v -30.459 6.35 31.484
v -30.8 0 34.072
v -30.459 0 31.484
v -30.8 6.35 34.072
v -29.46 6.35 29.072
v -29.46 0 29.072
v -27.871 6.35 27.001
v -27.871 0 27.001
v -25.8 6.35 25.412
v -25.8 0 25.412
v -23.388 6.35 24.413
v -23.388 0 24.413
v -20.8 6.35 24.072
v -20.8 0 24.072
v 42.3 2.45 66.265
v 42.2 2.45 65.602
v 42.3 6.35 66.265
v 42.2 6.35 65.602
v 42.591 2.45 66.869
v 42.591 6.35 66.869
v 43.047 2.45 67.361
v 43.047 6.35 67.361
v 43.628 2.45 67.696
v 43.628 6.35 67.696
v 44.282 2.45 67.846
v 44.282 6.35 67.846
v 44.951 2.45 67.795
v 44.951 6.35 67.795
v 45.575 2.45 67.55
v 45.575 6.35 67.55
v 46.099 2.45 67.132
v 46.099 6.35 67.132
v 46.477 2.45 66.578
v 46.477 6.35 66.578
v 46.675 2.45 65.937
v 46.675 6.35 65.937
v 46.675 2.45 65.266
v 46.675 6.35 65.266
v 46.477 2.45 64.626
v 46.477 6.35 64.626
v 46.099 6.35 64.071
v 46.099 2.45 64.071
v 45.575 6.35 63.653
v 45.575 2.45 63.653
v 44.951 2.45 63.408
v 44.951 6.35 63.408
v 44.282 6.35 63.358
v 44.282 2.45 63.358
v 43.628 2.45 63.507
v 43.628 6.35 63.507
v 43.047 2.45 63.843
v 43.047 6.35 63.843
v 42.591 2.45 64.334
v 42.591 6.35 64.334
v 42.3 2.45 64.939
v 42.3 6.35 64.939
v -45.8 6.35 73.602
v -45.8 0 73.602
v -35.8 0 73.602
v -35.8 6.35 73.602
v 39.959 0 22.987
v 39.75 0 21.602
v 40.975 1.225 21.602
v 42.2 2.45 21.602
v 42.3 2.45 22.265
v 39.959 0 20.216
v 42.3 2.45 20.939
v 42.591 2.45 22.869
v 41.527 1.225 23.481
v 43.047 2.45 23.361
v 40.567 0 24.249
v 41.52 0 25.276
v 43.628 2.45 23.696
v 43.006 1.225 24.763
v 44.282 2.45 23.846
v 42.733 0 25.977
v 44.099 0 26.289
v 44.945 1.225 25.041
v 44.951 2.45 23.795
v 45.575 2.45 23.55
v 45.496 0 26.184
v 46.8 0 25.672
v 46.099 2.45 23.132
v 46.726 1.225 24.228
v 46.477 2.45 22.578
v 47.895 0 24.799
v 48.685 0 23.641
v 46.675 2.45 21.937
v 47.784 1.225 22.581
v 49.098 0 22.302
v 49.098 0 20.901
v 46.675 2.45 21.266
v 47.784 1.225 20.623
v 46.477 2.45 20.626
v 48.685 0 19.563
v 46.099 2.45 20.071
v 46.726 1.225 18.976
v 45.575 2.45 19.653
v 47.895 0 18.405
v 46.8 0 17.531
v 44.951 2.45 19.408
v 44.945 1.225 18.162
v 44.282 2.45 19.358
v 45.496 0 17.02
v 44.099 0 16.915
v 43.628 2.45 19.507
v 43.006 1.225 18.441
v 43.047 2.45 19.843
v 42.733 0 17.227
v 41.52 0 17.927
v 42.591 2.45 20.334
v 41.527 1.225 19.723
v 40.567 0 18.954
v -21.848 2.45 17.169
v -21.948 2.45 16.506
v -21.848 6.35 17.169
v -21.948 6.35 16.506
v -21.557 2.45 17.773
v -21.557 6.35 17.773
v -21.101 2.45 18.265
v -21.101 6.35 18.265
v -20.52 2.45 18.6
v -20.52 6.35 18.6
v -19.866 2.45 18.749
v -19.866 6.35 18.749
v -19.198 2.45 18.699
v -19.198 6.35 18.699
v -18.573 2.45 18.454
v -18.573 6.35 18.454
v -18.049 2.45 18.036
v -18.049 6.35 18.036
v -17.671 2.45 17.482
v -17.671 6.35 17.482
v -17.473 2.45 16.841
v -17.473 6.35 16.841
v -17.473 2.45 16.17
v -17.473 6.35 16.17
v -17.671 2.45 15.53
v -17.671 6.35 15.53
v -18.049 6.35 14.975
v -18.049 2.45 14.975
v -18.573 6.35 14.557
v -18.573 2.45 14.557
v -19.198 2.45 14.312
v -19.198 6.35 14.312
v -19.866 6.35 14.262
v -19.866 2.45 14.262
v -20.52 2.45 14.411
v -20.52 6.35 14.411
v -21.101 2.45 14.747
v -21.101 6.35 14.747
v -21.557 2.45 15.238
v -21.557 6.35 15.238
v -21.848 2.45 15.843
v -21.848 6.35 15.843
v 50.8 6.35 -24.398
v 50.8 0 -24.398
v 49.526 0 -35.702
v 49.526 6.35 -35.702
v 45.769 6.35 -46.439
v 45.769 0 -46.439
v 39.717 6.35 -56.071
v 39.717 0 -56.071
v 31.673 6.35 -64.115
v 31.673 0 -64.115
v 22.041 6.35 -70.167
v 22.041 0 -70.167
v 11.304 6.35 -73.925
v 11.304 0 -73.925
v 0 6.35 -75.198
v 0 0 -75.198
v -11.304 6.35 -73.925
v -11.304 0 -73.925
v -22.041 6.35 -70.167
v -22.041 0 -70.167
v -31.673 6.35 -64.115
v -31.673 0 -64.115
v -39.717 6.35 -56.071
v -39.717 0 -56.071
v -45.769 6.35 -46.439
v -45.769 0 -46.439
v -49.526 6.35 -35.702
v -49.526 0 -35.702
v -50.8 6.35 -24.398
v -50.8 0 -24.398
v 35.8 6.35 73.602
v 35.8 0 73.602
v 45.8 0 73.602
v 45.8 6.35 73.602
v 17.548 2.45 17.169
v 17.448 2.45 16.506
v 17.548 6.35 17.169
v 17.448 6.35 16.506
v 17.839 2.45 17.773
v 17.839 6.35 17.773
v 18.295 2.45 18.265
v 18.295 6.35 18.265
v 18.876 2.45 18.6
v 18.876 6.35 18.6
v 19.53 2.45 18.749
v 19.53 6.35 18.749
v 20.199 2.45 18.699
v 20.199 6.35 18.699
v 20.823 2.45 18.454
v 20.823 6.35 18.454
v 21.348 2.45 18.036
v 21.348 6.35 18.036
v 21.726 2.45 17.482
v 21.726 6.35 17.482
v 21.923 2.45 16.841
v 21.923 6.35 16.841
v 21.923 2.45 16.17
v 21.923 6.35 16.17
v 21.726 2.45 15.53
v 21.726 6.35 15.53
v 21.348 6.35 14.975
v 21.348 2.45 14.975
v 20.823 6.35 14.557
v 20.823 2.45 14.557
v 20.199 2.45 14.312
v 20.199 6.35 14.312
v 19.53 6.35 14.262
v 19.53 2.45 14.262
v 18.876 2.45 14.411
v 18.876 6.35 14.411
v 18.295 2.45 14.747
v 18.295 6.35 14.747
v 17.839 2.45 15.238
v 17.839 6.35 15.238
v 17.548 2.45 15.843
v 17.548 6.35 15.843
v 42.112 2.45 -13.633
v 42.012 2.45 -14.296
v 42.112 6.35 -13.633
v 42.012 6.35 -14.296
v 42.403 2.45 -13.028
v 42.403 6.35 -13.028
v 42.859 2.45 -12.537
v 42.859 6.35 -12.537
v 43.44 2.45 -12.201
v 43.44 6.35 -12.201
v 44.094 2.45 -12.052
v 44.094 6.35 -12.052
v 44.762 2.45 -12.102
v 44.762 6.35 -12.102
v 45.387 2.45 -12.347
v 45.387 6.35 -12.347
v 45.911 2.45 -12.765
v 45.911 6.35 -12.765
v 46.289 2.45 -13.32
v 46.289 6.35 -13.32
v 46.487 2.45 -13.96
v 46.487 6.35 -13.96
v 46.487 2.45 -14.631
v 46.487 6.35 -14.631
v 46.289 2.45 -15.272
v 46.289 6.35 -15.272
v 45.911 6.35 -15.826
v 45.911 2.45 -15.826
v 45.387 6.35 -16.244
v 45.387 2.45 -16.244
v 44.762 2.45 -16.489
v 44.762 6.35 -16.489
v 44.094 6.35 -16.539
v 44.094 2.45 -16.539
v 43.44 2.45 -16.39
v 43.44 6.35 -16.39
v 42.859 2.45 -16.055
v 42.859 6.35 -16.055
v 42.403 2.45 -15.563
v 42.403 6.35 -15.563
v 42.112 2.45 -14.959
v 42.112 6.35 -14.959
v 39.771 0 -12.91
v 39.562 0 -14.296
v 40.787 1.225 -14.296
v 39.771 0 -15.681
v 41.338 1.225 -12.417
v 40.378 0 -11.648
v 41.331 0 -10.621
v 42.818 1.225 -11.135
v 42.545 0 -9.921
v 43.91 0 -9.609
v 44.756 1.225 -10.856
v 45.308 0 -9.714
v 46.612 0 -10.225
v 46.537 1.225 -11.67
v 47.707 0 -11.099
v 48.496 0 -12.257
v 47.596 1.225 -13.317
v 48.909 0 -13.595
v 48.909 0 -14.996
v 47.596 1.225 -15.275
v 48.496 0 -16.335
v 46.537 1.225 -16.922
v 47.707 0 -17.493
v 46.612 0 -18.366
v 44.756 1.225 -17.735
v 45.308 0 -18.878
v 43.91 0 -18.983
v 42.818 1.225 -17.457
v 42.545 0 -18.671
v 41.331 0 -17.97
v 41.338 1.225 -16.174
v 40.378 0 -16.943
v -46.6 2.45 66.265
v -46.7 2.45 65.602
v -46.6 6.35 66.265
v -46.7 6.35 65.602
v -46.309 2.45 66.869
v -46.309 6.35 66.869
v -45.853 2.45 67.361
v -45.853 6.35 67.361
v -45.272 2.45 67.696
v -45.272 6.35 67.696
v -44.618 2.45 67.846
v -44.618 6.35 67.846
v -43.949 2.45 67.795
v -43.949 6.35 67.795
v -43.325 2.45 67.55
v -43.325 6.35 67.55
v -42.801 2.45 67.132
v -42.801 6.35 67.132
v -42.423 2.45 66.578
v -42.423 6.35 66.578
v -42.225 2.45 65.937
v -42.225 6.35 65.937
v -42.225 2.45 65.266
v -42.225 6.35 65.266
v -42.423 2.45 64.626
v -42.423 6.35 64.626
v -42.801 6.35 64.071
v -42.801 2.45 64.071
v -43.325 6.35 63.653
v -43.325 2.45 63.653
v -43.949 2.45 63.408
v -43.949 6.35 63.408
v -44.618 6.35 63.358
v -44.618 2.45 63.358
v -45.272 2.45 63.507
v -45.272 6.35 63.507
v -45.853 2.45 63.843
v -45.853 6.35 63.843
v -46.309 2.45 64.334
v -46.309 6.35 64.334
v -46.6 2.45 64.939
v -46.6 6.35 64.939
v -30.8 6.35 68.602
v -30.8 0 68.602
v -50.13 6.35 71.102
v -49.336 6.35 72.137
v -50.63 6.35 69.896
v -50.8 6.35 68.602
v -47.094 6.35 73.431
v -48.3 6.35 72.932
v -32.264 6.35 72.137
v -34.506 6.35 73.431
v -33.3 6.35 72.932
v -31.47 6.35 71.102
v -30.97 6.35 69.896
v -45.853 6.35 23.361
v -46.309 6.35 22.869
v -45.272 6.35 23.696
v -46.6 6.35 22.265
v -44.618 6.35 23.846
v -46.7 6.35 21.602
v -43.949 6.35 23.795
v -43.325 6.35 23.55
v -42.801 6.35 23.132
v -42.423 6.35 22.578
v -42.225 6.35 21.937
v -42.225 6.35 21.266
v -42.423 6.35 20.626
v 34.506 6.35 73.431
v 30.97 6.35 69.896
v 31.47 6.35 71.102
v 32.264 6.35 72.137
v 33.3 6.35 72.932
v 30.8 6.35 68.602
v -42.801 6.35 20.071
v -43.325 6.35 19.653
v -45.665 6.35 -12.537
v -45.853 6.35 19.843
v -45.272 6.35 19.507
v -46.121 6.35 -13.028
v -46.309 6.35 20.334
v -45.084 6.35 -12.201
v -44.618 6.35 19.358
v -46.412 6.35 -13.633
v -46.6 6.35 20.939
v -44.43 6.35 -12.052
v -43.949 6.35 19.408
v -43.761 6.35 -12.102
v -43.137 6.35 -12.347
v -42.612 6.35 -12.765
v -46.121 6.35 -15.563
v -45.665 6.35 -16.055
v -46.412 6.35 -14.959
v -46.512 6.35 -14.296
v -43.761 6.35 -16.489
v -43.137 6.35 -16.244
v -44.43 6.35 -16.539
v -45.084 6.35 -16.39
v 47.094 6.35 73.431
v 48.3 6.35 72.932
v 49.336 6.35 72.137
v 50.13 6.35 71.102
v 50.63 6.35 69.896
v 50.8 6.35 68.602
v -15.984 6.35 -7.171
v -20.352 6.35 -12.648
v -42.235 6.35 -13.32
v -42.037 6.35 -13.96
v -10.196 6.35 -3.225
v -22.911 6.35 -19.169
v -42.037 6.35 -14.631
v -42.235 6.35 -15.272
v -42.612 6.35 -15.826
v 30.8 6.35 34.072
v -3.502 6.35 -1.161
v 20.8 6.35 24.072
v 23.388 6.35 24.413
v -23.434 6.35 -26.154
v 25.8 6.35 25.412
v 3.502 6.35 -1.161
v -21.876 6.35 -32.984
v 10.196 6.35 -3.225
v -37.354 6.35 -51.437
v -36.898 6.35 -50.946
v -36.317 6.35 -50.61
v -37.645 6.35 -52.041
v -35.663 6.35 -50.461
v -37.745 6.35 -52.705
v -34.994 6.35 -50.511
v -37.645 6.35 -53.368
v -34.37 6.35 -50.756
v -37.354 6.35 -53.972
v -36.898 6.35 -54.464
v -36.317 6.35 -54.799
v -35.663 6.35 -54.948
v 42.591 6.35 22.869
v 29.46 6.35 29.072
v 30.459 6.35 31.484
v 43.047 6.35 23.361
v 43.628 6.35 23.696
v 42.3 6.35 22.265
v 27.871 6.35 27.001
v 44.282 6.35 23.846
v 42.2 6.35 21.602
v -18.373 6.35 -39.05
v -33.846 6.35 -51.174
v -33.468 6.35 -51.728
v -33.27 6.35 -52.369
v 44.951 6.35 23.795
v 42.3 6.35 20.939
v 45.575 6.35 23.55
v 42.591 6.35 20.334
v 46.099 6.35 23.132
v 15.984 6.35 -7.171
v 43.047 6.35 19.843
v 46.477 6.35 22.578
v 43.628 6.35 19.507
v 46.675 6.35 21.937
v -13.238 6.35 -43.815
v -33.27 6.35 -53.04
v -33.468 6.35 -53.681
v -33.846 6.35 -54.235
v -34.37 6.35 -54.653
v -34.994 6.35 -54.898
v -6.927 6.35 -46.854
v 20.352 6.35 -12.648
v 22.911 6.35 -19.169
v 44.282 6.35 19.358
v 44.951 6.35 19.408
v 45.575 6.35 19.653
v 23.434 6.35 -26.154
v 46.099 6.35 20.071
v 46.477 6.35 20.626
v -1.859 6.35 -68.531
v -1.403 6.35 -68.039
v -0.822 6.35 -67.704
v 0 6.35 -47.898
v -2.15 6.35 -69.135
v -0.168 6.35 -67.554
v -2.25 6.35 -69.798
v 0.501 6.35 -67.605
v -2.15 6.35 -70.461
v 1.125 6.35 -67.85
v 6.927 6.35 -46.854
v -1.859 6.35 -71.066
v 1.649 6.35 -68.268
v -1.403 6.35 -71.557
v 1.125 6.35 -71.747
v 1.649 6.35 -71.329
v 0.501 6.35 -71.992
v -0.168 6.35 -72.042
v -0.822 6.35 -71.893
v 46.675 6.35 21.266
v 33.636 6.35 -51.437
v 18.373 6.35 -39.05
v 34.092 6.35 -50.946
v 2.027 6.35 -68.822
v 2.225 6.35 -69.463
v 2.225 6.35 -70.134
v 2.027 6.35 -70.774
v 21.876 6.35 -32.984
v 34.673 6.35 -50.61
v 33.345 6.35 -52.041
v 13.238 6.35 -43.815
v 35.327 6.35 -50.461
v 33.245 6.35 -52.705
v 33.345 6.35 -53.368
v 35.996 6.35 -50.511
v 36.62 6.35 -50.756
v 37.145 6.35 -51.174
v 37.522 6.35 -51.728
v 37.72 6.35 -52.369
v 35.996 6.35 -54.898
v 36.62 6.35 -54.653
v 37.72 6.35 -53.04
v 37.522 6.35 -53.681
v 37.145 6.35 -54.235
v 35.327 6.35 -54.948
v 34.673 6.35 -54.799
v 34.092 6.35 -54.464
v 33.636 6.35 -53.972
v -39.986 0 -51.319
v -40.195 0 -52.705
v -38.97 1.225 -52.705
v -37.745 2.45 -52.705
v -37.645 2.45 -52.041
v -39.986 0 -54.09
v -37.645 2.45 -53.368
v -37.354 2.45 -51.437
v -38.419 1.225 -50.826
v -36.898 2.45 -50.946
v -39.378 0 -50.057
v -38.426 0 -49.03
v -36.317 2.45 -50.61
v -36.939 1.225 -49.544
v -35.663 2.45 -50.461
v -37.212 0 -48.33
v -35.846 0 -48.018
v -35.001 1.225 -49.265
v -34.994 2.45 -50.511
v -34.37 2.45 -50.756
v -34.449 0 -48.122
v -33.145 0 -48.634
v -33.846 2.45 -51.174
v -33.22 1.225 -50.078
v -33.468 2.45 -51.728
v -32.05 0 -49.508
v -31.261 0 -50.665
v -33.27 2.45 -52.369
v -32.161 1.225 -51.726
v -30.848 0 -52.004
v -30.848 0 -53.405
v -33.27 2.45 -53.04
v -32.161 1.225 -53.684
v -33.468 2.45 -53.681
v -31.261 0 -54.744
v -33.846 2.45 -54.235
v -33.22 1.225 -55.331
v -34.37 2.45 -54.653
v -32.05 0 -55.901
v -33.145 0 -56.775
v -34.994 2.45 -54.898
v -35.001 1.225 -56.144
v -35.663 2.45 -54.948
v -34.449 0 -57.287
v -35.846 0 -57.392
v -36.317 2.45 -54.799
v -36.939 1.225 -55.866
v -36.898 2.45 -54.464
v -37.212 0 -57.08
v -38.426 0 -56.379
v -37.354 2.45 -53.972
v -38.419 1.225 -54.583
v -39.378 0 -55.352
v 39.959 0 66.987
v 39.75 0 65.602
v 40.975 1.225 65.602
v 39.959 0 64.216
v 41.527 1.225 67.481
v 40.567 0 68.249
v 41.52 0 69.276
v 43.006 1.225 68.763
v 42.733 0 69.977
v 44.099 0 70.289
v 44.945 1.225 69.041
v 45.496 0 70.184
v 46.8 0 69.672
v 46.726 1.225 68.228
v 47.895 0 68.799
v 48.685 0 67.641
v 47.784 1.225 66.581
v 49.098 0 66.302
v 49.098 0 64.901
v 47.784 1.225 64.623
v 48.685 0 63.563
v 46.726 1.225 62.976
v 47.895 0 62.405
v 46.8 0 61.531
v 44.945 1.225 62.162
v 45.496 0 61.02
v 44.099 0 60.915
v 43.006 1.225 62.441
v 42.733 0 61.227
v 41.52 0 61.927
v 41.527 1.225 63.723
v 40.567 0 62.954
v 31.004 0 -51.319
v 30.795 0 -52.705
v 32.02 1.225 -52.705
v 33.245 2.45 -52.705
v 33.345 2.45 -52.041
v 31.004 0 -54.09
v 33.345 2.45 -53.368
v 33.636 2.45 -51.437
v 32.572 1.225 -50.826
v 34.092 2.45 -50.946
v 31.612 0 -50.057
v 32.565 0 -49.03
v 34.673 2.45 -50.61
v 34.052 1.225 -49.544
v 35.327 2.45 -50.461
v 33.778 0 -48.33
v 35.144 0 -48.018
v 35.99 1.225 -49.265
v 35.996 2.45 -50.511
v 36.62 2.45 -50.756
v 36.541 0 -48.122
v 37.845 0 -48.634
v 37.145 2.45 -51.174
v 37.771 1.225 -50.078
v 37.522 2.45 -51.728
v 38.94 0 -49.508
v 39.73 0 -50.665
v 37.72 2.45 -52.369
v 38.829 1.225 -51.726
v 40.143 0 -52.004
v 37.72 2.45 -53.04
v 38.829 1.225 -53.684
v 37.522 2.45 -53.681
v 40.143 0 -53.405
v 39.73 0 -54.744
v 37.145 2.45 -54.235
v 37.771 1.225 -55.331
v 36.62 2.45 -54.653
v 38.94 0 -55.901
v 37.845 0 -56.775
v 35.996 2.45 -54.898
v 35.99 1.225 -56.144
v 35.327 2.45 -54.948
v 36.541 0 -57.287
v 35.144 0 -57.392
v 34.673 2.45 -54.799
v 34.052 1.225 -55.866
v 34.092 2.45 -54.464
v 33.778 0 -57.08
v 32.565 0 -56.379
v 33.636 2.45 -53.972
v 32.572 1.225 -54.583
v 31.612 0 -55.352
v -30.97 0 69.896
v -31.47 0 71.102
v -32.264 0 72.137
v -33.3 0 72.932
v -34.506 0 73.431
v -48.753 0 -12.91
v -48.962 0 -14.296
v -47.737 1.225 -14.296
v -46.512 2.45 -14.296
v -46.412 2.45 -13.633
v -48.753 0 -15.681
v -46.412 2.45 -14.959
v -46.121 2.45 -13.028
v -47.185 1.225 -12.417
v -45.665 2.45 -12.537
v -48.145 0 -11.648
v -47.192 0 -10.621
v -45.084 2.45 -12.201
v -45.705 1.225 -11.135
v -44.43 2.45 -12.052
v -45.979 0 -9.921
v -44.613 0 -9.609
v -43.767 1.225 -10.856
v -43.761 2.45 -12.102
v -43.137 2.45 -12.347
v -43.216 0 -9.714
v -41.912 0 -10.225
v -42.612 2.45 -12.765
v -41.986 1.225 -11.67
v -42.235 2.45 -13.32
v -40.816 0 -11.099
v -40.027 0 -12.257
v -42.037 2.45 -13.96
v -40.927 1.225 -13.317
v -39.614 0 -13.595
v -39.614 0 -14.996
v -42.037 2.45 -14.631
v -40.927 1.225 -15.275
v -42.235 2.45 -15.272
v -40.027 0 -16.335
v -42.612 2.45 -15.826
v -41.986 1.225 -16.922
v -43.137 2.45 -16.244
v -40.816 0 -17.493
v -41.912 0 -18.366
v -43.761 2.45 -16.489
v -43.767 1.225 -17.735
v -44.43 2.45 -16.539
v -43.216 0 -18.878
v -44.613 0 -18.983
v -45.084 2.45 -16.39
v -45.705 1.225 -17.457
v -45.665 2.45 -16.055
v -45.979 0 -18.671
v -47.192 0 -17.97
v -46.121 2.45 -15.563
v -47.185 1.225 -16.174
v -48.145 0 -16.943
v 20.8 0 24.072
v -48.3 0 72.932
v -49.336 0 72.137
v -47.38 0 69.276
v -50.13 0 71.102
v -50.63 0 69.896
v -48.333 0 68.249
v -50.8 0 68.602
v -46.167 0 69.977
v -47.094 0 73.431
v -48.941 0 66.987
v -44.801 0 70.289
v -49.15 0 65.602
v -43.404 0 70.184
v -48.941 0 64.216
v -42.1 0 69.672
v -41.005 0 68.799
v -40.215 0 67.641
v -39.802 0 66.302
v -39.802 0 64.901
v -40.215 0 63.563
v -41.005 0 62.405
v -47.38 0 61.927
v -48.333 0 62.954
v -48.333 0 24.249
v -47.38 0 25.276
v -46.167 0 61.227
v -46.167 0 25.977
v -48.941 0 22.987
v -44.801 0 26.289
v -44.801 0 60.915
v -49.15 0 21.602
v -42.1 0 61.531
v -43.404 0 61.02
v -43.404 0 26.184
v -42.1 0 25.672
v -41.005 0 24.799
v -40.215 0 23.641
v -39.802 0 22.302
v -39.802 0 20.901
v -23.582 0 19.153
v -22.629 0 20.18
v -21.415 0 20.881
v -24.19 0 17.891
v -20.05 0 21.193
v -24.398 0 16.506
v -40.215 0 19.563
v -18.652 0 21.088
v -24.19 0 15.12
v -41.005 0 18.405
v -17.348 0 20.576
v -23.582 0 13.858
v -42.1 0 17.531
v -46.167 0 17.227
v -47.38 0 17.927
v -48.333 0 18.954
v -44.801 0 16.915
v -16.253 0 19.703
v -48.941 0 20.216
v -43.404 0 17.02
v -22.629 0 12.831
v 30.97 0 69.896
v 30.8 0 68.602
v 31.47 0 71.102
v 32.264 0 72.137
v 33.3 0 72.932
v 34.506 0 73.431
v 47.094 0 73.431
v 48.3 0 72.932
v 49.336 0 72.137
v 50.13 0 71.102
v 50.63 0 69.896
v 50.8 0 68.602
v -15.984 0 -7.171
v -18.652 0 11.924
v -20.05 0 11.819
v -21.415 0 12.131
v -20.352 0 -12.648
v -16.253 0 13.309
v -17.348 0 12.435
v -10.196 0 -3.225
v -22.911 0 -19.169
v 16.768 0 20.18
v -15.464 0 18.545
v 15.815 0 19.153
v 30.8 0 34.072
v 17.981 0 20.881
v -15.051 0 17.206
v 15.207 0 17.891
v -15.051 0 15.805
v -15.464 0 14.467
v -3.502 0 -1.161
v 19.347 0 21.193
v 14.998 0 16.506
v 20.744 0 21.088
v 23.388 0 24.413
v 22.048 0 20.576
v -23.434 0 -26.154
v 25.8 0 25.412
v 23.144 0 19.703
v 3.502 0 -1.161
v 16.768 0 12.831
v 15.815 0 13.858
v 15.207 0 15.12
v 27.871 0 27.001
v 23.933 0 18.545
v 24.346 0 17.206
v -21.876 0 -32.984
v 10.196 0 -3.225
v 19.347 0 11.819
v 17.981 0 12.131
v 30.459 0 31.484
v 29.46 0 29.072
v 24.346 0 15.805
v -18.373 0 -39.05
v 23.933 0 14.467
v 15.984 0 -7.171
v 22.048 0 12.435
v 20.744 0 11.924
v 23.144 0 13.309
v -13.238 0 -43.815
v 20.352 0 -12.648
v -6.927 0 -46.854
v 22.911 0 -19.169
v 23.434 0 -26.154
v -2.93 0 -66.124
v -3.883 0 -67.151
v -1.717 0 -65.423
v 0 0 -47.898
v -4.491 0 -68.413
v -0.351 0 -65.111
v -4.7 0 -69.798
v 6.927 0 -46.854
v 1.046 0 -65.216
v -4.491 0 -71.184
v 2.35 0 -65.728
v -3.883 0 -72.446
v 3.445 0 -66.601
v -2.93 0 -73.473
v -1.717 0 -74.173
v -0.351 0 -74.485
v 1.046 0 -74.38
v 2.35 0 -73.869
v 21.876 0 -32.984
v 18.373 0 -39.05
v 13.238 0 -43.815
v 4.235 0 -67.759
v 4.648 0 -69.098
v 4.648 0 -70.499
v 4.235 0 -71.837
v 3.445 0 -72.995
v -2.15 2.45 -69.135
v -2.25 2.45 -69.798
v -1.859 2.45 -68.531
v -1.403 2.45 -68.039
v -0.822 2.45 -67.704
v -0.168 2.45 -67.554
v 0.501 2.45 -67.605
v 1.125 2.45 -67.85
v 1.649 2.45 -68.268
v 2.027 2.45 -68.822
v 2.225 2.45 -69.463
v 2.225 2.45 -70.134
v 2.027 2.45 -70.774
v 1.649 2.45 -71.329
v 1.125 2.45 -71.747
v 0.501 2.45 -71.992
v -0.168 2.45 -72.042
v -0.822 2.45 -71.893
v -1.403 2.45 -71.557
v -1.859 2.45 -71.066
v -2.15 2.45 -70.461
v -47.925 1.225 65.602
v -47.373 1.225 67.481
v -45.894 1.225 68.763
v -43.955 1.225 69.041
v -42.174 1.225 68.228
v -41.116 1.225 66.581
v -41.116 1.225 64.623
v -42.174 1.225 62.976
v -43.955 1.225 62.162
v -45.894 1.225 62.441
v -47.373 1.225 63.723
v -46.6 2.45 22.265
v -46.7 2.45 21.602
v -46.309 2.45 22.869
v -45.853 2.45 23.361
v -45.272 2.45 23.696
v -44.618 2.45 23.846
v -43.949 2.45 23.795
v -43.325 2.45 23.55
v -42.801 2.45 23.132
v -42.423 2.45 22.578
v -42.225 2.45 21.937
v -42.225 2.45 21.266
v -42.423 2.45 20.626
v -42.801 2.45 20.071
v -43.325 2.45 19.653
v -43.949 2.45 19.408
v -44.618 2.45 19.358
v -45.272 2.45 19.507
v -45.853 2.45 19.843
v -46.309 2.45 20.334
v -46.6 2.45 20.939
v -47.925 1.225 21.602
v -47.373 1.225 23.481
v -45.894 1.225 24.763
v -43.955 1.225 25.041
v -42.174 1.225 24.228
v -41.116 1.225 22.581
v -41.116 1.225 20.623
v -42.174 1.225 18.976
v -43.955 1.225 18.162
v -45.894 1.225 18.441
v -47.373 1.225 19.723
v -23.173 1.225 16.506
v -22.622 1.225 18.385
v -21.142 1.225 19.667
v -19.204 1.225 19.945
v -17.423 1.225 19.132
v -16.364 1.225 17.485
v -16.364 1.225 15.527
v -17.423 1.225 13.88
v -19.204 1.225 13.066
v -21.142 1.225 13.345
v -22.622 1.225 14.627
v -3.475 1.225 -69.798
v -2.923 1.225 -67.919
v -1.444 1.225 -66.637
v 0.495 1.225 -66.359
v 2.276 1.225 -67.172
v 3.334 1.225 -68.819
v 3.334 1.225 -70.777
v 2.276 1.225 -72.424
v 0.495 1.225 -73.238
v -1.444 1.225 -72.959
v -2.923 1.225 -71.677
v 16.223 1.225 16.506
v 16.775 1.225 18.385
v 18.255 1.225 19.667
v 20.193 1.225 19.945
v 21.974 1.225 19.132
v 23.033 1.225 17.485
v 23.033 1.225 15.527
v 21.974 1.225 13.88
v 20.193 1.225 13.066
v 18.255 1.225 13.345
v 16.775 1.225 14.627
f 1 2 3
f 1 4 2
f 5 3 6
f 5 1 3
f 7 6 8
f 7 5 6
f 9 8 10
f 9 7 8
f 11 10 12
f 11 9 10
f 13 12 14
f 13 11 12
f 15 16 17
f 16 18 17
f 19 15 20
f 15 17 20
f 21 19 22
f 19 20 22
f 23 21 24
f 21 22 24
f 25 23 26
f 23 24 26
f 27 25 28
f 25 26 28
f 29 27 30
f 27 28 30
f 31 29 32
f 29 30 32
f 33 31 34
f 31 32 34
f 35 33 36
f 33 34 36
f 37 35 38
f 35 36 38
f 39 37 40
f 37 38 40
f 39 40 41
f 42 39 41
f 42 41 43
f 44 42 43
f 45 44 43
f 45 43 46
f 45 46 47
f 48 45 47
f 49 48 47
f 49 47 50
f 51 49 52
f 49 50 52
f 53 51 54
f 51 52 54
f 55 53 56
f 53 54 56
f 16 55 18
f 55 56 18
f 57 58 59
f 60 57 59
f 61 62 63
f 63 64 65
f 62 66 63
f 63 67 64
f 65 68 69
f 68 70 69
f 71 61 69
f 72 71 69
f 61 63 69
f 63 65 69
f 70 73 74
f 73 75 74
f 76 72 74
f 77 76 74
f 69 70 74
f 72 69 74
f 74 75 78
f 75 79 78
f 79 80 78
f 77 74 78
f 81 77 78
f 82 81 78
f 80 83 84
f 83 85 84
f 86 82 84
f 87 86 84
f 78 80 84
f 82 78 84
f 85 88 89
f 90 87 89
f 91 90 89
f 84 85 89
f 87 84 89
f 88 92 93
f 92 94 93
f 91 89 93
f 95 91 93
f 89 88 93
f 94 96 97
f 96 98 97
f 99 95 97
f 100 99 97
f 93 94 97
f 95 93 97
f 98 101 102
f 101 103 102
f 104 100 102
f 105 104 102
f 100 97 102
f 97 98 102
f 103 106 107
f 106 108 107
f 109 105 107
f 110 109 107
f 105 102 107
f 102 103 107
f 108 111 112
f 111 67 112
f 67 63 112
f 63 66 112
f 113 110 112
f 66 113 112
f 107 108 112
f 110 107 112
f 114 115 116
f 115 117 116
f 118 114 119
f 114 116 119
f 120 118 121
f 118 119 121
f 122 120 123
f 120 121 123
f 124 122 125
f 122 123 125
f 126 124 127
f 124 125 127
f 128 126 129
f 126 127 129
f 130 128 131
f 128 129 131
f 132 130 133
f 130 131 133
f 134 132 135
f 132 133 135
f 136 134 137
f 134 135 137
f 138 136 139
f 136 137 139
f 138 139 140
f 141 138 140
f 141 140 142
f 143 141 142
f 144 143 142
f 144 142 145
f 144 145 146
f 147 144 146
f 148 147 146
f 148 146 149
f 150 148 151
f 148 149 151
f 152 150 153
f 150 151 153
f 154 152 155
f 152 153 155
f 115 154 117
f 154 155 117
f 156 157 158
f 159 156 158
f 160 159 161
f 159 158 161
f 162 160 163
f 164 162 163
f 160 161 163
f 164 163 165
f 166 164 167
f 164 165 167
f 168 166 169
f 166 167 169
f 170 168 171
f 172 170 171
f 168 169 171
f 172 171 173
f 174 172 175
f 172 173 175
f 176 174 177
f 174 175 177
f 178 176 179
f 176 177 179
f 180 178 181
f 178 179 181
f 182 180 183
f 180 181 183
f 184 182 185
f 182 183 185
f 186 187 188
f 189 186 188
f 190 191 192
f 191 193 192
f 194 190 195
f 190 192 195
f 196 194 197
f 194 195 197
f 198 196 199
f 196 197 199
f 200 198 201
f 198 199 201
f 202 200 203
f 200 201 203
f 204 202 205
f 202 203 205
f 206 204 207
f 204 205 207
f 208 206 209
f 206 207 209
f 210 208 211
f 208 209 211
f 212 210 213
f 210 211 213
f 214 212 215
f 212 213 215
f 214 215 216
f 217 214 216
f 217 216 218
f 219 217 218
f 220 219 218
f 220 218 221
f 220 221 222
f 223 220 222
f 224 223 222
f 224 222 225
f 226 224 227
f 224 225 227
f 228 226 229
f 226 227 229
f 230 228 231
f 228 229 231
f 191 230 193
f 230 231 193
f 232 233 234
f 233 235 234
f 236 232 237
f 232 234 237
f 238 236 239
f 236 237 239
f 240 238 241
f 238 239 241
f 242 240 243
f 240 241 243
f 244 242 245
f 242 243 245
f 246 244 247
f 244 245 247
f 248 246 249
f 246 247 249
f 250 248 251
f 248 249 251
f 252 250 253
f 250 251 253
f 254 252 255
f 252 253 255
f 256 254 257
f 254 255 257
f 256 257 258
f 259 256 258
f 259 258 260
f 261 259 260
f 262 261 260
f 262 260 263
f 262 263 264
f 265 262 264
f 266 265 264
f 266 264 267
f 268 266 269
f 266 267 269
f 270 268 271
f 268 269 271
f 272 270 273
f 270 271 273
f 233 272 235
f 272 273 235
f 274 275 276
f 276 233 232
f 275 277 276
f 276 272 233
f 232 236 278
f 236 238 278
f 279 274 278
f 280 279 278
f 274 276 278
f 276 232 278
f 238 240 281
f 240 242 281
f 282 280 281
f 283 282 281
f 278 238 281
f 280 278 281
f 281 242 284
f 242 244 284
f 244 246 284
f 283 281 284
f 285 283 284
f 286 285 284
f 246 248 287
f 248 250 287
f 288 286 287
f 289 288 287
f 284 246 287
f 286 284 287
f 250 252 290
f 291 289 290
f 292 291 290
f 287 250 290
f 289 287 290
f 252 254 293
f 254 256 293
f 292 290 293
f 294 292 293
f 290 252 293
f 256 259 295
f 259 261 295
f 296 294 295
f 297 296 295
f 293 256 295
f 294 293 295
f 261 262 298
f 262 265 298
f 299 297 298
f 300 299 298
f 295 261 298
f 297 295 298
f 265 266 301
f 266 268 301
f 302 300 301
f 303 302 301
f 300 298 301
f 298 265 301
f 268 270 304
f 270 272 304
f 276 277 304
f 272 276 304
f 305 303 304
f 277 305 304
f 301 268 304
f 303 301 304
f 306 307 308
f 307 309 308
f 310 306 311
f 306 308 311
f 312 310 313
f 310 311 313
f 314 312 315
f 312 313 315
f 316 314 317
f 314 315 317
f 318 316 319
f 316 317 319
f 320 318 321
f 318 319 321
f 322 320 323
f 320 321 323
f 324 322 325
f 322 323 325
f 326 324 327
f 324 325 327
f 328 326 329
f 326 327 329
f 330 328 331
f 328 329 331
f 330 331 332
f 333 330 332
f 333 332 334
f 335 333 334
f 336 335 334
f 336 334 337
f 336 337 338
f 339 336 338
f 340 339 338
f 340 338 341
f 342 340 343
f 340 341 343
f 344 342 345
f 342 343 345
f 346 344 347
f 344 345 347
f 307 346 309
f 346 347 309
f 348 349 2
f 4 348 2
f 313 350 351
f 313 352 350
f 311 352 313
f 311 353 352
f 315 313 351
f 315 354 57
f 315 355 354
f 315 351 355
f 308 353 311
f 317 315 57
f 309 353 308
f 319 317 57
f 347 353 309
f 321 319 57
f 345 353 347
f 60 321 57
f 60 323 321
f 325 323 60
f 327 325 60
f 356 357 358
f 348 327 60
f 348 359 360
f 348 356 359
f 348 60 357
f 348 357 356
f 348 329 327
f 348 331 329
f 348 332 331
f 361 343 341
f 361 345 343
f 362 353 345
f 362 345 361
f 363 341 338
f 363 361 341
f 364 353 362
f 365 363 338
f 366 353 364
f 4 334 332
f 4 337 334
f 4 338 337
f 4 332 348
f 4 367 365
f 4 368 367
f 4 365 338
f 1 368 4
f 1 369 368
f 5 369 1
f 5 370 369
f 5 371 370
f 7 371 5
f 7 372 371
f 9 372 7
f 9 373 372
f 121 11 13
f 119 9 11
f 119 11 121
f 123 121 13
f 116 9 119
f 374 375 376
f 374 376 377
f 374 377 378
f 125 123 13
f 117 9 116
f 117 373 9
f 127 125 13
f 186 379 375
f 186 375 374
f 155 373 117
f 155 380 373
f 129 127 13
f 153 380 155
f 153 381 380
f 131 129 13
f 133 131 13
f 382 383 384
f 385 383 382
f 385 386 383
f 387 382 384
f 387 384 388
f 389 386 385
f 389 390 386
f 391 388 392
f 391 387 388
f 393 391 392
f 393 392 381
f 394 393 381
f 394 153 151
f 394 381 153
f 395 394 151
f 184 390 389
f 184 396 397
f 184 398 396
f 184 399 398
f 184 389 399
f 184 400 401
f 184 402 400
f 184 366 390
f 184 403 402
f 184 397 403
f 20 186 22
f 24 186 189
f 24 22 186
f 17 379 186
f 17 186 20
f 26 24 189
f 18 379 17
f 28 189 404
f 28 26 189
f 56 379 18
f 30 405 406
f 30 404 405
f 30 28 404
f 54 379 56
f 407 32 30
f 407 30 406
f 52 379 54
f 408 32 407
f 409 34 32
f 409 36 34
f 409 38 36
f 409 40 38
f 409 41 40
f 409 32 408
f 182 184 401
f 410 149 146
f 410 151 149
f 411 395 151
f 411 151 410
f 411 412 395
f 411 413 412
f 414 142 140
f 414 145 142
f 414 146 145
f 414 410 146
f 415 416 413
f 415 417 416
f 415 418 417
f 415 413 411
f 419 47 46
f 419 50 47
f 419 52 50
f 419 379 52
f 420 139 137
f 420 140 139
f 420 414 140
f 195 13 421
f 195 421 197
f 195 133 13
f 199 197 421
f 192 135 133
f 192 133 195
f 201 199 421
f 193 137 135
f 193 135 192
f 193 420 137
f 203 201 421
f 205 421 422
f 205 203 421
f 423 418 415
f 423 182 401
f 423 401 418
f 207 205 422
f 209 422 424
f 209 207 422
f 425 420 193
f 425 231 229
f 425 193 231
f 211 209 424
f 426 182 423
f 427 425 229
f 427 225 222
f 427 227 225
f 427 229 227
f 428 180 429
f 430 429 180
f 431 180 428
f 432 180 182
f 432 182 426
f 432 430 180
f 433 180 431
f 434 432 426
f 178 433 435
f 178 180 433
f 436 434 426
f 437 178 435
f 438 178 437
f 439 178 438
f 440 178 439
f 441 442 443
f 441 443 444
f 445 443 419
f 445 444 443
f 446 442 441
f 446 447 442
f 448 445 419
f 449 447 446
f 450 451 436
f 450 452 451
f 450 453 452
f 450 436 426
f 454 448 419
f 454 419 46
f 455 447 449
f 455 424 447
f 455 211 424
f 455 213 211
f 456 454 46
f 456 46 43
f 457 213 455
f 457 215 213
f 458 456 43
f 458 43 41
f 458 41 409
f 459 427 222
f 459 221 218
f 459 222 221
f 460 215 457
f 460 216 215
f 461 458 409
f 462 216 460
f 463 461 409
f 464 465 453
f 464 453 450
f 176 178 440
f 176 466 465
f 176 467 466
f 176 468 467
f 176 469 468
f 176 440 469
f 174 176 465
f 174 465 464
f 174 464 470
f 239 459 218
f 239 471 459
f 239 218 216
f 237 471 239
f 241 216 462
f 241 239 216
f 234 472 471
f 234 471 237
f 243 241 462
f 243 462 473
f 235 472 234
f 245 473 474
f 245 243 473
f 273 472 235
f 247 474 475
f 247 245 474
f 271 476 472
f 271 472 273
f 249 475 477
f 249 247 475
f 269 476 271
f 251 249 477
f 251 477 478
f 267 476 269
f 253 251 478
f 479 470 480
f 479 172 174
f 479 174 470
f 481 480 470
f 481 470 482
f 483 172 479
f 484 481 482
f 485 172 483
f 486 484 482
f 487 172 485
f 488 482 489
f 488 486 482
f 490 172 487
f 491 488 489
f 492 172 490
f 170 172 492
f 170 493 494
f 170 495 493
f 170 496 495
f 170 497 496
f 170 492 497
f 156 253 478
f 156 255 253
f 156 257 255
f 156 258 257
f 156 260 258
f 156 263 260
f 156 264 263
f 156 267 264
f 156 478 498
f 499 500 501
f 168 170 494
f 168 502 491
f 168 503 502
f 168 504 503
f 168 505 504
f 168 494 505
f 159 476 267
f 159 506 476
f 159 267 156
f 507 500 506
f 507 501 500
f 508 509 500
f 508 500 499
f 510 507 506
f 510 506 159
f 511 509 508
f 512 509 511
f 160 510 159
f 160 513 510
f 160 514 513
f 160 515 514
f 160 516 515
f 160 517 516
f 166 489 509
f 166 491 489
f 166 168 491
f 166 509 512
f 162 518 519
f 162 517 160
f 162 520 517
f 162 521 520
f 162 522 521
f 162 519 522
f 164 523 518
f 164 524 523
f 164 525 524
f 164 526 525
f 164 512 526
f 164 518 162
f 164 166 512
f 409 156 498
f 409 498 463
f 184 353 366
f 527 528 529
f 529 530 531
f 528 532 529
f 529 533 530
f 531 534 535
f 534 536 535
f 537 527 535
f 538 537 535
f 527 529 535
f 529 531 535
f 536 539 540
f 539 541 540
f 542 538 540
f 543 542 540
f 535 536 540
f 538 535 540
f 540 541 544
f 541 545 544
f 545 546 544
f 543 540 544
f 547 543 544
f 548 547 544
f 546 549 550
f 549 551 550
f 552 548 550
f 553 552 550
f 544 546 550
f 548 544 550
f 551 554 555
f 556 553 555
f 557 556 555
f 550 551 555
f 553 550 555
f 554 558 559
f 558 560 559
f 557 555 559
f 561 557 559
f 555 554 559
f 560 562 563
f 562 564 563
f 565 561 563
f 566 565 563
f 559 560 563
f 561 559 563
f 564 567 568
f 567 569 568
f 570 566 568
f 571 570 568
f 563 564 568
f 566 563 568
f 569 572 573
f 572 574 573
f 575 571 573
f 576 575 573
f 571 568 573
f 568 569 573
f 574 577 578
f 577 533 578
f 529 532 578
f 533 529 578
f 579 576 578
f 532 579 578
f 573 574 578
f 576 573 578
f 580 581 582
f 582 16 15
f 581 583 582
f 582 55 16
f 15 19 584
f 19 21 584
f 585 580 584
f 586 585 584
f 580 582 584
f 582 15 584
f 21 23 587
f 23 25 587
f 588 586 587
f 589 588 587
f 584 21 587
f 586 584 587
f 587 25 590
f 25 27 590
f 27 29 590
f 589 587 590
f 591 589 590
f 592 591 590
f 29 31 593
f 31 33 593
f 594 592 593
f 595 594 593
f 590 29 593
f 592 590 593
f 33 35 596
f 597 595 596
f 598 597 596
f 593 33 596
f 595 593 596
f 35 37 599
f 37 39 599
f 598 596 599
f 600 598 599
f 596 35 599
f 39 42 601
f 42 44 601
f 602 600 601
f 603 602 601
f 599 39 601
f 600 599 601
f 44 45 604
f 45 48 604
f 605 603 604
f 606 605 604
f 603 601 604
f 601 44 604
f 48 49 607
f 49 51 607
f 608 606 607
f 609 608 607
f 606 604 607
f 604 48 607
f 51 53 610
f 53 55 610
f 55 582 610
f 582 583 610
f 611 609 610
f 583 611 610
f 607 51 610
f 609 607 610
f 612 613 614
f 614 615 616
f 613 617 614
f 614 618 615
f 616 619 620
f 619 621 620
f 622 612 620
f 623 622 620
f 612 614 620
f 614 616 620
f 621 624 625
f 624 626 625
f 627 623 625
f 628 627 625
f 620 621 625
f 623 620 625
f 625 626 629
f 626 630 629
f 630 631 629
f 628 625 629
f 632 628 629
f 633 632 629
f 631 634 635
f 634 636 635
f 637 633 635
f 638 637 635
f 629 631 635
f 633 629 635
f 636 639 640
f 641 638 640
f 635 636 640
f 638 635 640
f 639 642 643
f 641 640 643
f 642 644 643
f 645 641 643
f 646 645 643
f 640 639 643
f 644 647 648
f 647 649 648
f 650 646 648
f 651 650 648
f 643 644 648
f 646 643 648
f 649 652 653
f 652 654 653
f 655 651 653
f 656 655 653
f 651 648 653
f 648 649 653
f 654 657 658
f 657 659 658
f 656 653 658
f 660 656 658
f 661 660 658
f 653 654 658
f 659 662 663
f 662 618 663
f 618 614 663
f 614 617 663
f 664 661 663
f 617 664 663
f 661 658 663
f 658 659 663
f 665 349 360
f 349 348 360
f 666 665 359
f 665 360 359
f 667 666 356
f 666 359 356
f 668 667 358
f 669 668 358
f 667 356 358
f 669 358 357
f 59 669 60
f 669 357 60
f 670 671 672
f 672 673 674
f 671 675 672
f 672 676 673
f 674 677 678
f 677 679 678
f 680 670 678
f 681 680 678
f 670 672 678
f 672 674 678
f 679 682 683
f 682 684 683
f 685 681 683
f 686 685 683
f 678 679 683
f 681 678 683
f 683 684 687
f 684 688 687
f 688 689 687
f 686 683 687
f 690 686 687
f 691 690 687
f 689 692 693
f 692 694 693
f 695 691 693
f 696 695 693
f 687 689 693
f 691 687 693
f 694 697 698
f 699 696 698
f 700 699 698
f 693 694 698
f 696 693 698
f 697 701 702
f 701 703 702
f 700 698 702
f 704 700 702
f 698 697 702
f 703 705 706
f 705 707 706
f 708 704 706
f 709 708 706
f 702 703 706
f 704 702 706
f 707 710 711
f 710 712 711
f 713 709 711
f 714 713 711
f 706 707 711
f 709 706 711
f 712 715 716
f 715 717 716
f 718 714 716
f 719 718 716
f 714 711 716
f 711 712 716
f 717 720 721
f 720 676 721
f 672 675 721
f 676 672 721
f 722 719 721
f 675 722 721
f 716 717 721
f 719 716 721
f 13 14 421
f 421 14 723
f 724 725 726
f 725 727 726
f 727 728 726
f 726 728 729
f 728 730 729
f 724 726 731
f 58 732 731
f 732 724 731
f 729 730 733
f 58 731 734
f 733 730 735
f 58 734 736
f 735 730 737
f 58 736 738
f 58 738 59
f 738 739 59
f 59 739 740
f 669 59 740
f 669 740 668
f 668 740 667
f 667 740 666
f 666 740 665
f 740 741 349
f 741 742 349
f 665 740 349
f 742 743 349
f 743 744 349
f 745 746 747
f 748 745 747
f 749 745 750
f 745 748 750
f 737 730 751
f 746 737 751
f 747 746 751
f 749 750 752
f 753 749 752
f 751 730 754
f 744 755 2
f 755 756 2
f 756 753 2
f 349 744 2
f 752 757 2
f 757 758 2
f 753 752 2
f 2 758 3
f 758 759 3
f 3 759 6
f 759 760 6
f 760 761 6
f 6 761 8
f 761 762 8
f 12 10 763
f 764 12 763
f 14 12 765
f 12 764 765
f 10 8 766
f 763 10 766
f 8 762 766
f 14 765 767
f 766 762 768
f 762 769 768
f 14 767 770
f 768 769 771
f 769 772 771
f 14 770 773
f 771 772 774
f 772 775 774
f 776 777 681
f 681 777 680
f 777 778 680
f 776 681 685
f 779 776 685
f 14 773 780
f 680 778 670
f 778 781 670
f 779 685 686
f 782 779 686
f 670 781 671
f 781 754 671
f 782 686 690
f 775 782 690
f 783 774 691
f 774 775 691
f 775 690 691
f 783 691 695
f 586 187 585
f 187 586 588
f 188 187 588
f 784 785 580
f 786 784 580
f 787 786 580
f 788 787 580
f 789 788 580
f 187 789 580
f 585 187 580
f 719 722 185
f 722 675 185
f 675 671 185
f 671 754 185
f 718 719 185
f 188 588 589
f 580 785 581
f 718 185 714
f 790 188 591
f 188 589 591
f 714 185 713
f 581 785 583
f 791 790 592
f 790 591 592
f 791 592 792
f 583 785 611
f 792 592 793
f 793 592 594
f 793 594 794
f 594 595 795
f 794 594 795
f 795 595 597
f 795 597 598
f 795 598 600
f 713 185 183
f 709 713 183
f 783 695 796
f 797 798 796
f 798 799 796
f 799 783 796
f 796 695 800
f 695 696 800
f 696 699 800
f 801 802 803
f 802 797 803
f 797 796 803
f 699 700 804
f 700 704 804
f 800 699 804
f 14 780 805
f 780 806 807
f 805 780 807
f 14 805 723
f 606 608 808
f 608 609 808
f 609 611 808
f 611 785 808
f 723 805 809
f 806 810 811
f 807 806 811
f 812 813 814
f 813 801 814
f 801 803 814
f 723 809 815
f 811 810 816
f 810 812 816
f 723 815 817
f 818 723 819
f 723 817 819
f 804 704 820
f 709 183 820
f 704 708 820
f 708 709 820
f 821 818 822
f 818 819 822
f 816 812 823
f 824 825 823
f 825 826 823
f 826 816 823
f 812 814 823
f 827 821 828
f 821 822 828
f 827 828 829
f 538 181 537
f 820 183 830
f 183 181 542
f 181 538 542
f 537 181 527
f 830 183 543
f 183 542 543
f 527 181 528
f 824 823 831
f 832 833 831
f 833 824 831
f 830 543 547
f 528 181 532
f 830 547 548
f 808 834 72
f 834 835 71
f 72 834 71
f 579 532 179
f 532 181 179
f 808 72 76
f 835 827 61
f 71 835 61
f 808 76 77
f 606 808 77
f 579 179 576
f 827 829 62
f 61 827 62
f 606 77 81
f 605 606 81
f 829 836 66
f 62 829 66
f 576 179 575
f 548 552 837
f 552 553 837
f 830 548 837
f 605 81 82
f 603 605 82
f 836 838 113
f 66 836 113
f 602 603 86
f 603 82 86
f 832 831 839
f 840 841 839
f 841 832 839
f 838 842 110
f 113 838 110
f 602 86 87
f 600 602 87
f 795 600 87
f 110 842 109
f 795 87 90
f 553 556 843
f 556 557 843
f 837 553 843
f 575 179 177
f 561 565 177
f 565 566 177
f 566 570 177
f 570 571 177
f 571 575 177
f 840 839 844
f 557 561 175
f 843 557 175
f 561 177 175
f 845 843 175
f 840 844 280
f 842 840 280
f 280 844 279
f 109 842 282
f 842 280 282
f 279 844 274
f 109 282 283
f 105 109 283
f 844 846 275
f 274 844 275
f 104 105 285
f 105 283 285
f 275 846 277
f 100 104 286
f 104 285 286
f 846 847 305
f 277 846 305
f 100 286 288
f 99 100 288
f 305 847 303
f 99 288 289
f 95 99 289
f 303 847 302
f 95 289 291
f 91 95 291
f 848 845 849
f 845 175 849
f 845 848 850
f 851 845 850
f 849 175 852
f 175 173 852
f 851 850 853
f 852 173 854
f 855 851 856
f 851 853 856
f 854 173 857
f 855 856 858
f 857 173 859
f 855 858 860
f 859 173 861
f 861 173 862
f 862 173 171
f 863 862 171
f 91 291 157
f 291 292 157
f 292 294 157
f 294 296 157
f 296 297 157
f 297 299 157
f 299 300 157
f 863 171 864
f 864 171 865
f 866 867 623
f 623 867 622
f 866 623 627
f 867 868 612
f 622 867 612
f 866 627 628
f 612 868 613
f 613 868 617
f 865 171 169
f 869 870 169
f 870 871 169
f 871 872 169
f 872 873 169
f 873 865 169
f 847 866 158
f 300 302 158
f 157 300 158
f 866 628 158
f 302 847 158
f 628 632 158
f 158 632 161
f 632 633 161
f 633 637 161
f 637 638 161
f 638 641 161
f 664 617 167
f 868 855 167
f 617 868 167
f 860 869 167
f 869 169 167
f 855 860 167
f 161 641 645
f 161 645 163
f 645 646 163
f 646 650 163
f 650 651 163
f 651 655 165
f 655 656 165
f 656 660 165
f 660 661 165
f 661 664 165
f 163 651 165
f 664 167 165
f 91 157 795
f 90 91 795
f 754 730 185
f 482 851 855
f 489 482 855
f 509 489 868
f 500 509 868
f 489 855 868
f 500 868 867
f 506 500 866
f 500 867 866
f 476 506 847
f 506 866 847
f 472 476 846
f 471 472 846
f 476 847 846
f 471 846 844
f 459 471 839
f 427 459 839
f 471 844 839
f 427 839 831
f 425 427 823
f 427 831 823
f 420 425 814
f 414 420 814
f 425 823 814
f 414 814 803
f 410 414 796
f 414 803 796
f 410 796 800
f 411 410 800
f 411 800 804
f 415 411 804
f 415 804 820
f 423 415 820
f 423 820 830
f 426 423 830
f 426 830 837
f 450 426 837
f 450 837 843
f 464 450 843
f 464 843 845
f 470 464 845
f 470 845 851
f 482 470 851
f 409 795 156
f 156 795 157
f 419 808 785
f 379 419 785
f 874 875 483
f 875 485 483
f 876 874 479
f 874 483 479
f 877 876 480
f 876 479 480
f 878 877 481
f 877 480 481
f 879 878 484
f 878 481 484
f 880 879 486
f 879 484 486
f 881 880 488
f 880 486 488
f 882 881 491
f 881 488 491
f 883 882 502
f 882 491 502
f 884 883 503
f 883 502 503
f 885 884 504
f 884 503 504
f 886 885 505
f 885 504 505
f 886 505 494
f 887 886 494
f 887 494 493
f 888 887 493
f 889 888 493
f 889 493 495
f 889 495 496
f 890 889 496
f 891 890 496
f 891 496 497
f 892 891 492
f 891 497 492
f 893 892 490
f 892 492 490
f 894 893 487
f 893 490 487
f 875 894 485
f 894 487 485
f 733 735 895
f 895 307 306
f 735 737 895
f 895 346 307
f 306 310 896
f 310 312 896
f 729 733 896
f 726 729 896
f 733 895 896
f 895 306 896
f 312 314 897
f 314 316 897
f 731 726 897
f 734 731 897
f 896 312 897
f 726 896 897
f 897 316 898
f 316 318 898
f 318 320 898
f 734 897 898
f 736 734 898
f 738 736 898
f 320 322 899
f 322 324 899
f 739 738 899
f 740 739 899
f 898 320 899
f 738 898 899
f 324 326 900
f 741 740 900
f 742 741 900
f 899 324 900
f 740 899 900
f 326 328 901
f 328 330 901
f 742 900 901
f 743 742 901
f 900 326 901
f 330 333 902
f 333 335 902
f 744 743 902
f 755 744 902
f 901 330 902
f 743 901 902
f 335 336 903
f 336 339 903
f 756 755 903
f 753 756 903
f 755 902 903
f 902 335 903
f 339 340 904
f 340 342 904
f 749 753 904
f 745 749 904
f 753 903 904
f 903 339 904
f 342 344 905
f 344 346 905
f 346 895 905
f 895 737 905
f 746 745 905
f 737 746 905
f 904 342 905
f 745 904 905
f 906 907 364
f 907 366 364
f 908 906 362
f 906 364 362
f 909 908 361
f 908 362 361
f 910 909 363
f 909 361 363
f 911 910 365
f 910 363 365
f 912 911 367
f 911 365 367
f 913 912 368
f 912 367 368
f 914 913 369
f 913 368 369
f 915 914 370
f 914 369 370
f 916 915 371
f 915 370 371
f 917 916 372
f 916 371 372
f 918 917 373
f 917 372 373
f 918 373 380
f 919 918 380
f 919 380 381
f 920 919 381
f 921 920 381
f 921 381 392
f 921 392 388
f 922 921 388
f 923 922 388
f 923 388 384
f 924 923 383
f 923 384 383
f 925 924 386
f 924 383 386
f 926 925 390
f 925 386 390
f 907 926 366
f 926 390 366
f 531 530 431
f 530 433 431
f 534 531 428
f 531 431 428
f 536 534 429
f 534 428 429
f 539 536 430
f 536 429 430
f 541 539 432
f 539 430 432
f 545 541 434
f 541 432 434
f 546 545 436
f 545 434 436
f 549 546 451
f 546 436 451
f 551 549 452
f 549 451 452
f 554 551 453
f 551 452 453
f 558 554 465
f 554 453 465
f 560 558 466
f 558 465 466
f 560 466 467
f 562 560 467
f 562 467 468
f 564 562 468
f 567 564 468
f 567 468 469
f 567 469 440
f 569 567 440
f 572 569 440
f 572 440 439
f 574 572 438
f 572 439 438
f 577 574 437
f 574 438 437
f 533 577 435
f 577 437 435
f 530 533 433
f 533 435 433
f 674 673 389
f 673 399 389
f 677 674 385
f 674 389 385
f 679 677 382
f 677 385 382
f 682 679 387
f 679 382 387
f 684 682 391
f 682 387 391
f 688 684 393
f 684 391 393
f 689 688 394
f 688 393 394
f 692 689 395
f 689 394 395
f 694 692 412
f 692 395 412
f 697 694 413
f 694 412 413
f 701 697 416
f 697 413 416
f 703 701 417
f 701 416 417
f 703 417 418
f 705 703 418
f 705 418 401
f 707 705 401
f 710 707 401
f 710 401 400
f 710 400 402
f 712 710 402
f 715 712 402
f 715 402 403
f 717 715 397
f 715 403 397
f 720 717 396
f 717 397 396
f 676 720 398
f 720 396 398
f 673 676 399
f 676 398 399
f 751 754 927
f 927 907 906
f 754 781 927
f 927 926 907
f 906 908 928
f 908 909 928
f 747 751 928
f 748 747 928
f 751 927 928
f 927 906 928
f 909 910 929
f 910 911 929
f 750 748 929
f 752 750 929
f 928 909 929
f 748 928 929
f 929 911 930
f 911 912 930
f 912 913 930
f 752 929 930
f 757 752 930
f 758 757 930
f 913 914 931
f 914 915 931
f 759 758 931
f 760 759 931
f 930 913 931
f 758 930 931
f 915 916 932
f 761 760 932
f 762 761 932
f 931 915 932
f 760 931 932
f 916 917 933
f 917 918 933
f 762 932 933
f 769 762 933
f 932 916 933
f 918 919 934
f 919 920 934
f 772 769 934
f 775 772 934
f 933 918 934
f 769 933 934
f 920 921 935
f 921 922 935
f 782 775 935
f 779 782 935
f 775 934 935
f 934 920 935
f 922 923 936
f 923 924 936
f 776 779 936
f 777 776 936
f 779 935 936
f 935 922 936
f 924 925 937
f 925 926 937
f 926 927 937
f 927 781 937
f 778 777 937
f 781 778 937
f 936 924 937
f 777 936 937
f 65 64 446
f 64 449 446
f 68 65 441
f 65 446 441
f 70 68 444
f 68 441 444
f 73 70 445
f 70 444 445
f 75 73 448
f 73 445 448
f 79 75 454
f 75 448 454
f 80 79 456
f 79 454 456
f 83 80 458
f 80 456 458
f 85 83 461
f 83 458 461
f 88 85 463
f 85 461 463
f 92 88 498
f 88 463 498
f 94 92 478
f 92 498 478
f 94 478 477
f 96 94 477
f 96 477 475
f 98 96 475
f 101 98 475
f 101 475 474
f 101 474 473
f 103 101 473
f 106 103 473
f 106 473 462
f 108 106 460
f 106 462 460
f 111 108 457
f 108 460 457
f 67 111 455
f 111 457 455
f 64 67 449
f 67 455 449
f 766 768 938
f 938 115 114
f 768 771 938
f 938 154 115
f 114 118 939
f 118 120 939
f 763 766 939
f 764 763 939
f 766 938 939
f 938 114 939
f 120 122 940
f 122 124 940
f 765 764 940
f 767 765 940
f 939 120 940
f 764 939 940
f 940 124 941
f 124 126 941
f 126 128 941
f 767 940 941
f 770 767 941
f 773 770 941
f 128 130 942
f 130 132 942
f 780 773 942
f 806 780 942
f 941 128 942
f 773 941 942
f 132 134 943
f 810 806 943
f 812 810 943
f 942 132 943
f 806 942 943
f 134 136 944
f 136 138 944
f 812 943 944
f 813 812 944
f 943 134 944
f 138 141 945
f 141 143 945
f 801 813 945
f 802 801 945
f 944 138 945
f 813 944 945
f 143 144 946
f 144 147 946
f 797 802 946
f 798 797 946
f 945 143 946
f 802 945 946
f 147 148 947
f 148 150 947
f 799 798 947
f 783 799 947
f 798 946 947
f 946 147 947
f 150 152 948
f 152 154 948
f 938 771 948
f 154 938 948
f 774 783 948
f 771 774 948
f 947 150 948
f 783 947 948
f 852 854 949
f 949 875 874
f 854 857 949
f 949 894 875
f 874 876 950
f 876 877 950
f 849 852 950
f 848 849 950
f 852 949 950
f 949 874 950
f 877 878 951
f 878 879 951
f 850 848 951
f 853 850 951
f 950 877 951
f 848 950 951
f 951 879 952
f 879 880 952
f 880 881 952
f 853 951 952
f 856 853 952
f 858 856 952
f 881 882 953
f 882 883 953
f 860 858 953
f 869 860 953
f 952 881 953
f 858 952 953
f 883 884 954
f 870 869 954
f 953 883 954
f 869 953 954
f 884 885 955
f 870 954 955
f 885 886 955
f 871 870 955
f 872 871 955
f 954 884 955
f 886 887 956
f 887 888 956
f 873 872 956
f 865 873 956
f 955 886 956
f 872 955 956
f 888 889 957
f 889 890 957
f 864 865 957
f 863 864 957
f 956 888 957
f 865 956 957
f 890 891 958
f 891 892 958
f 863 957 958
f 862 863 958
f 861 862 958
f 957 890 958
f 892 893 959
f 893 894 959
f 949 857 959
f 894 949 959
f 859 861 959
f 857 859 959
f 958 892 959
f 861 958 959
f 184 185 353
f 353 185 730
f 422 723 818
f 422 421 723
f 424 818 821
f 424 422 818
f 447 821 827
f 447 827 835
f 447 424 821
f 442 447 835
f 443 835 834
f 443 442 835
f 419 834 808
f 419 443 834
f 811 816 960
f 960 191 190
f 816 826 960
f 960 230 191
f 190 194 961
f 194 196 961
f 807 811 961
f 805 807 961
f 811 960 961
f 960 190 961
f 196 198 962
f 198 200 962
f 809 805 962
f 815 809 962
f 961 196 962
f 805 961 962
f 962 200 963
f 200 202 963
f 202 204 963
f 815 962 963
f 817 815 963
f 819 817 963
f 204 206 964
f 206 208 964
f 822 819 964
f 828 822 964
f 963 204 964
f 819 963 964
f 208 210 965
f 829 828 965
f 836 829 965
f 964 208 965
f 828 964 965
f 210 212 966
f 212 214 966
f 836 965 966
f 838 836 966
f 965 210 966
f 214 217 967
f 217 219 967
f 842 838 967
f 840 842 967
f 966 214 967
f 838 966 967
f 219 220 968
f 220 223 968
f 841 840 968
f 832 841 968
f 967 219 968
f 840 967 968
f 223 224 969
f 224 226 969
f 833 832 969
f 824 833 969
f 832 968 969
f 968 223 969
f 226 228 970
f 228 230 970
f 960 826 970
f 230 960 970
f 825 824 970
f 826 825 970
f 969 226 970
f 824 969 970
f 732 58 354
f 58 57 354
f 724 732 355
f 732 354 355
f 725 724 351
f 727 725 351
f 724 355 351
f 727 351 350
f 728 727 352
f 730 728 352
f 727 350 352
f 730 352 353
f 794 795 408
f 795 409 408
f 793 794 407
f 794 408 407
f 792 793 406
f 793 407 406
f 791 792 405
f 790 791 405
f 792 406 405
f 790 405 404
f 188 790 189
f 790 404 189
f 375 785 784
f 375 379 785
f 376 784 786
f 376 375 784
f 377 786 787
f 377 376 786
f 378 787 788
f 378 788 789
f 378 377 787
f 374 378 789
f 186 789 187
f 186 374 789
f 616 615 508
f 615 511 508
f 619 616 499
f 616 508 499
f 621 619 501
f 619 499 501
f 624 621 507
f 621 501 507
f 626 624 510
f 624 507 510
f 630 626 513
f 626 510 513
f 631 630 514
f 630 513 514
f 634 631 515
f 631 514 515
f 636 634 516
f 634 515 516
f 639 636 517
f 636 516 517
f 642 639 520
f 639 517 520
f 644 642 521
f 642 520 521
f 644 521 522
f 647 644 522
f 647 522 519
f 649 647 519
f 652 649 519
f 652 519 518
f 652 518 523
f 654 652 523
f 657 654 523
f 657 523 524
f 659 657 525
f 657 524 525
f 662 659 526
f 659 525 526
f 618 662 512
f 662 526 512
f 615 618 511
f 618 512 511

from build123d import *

# Parameters (mm, degrees)
BOSS_EXTRUDE1_DEPTH                             = 6.35
FILLET1_R                                       = 10
CSK_FOR_M4_FLAT_HEAD_MACHINE_SCREW1_D           = 4.5
CSK_FOR_M4_FLAT_HEAD_MACHINE_SCREW1_DEPTH       = 41.15
CSK_FOR_M4_FLAT_HEAD_MACHINE_SCREW1_CSINK_D     = 9.4
CSK_FOR_M4_FLAT_HEAD_MACHINE_SCREW1_CSINK_ANGLE = 90
CSK_FOR_M4_FLAT_HEAD_MACHINE_SCREW1_TIP         = 1.351936393
SKETCH5_R                                       = 23.5
CUT_EXTRUDE1_DEPTH                              = 91.971053662
FILLET2_R                                       = 5


with BuildPart() as part:
    # Sketch1 → Boss-Extrude1 (new body)
    with BuildSketch(Plane(origin=(0, 0, 0), x_dir=(1, 0, 0), z_dir=(0, 1, 0))):
        with BuildLine():
            ThreePointArc((-15.208520638, -24.071794541), (-40.946506862, -5.668779355), (-50.8, 24.398205459))
            Line((-50.8, 24.398205459), (-50.8, -73.601794541))
            Line((-50.8, -73.601794541), (-30.8, -73.601794541))
            Line((-30.8, -73.601794541), (-30.8, -24.071794541))
            Line((-30.8, -24.071794541), (-15.208520638, -24.071794541))
        make_face()
        with BuildLine():
            Line((0, 24.398205459), (-50.8, 24.398205459))
            ThreePointArc((-50.8, 24.398205459), (-40.946506862, -5.668779355), (-15.208520638, -24.071794541))
            Line((-15.208520638, -24.071794541), (0, -24.071794541))
            Line((0, -24.071794541), (0, 24.398205459))
        make_face()
        with BuildLine():
            Line((50.8, 24.398205459), (0, 24.398205459))
            Line((0, 24.398205459), (0, -24.071794541))
            Line((0, -24.071794541), (15.208520638, -24.071794541))
            ThreePointArc((15.208520638, -24.071794541), (40.946506862, -5.668779355), (50.8, 24.398205459))
        make_face()
        with BuildLine():
            ThreePointArc((50.8, 24.398205459), (0, 75.198205459), (-50.8, 24.398205459))
            Line((-50.8, 24.398205459), (0, 24.398205459))
            Line((0, 24.398205459), (50.8, 24.398205459))
        make_face()
        with BuildLine():
            Line((50.8, -73.601794541), (50.8, 24.398205459))
            ThreePointArc((50.8, 24.398205459), (40.946506862, -5.668779355), (15.208520638, -24.071794541))
            Line((15.208520638, -24.071794541), (30.8, -24.071794541))
            Line((30.8, -24.071794541), (30.8, -73.601794541))
            Line((30.8, -73.601794541), (50.8, -73.601794541))
        make_face()
    extrude(amount=BOSS_EXTRUDE1_DEPTH)

    # Fillet1
    fillet1_edges = [part.edges().sort_by_distance(p)[0] for p in [
        (-30.8, 3.175, 24.071794541),
        (30.8, 3.175, 24.071794541),
    ]]
    fillet(fillet1_edges, radius=FILLET1_R)

    # CSK for M4 Flat Head Machine Screw1
    with Locations(Plane.XZ):
        with Locations((44.261727213, -14.295755058), (-44.45, 65.601794541), (44.45, 65.601794541), (-44.45, 21.601794541), (44.45, 21.601794541), (19.698321756, 16.505781144), (-19.698321756, 16.505781144), (-44.261727213, -14.295755058), (-35.495149304, -52.704642464), (0, -69.798205459), (35.495149304, -52.704642464)):
            CounterSinkHole(CSK_FOR_M4_FLAT_HEAD_MACHINE_SCREW1_D / 2, CSK_FOR_M4_FLAT_HEAD_MACHINE_SCREW1_CSINK_D / 2, depth=CSK_FOR_M4_FLAT_HEAD_MACHINE_SCREW1_DEPTH, counter_sink_angle=CSK_FOR_M4_FLAT_HEAD_MACHINE_SCREW1_CSINK_ANGLE)
            with Locations((0, 0, -(CSK_FOR_M4_FLAT_HEAD_MACHINE_SCREW1_DEPTH + CSK_FOR_M4_FLAT_HEAD_MACHINE_SCREW1_TIP / 2))):  # 118° drill point
                Cone(0, CSK_FOR_M4_FLAT_HEAD_MACHINE_SCREW1_D / 2, CSK_FOR_M4_FLAT_HEAD_MACHINE_SCREW1_TIP, mode=Mode.SUBTRACT)

    # Sketch5 → Cut-Extrude1 (cut, through all)
    with BuildSketch(Plane.XZ):
        with Locations(Location((0, -24.398205459, 0), (0, 0, 270))):
            Circle(SKETCH5_R)
    extrude(amount=-CUT_EXTRUDE1_DEPTH, mode=Mode.SUBTRACT)

    # Fillet2
    fillet2_edges = [part.edges().sort_by_distance(p)[0] for p in [
        (-30.8, 3.175, 73.601794541),
        (-50.8, 3.175, 73.601794541),
        (50.8, 3.175, 73.601794541),
        (30.8, 3.175, 73.601794541),
    ]]
    fillet(fillet2_edges, radius=FILLET2_R)


solid = part.part
